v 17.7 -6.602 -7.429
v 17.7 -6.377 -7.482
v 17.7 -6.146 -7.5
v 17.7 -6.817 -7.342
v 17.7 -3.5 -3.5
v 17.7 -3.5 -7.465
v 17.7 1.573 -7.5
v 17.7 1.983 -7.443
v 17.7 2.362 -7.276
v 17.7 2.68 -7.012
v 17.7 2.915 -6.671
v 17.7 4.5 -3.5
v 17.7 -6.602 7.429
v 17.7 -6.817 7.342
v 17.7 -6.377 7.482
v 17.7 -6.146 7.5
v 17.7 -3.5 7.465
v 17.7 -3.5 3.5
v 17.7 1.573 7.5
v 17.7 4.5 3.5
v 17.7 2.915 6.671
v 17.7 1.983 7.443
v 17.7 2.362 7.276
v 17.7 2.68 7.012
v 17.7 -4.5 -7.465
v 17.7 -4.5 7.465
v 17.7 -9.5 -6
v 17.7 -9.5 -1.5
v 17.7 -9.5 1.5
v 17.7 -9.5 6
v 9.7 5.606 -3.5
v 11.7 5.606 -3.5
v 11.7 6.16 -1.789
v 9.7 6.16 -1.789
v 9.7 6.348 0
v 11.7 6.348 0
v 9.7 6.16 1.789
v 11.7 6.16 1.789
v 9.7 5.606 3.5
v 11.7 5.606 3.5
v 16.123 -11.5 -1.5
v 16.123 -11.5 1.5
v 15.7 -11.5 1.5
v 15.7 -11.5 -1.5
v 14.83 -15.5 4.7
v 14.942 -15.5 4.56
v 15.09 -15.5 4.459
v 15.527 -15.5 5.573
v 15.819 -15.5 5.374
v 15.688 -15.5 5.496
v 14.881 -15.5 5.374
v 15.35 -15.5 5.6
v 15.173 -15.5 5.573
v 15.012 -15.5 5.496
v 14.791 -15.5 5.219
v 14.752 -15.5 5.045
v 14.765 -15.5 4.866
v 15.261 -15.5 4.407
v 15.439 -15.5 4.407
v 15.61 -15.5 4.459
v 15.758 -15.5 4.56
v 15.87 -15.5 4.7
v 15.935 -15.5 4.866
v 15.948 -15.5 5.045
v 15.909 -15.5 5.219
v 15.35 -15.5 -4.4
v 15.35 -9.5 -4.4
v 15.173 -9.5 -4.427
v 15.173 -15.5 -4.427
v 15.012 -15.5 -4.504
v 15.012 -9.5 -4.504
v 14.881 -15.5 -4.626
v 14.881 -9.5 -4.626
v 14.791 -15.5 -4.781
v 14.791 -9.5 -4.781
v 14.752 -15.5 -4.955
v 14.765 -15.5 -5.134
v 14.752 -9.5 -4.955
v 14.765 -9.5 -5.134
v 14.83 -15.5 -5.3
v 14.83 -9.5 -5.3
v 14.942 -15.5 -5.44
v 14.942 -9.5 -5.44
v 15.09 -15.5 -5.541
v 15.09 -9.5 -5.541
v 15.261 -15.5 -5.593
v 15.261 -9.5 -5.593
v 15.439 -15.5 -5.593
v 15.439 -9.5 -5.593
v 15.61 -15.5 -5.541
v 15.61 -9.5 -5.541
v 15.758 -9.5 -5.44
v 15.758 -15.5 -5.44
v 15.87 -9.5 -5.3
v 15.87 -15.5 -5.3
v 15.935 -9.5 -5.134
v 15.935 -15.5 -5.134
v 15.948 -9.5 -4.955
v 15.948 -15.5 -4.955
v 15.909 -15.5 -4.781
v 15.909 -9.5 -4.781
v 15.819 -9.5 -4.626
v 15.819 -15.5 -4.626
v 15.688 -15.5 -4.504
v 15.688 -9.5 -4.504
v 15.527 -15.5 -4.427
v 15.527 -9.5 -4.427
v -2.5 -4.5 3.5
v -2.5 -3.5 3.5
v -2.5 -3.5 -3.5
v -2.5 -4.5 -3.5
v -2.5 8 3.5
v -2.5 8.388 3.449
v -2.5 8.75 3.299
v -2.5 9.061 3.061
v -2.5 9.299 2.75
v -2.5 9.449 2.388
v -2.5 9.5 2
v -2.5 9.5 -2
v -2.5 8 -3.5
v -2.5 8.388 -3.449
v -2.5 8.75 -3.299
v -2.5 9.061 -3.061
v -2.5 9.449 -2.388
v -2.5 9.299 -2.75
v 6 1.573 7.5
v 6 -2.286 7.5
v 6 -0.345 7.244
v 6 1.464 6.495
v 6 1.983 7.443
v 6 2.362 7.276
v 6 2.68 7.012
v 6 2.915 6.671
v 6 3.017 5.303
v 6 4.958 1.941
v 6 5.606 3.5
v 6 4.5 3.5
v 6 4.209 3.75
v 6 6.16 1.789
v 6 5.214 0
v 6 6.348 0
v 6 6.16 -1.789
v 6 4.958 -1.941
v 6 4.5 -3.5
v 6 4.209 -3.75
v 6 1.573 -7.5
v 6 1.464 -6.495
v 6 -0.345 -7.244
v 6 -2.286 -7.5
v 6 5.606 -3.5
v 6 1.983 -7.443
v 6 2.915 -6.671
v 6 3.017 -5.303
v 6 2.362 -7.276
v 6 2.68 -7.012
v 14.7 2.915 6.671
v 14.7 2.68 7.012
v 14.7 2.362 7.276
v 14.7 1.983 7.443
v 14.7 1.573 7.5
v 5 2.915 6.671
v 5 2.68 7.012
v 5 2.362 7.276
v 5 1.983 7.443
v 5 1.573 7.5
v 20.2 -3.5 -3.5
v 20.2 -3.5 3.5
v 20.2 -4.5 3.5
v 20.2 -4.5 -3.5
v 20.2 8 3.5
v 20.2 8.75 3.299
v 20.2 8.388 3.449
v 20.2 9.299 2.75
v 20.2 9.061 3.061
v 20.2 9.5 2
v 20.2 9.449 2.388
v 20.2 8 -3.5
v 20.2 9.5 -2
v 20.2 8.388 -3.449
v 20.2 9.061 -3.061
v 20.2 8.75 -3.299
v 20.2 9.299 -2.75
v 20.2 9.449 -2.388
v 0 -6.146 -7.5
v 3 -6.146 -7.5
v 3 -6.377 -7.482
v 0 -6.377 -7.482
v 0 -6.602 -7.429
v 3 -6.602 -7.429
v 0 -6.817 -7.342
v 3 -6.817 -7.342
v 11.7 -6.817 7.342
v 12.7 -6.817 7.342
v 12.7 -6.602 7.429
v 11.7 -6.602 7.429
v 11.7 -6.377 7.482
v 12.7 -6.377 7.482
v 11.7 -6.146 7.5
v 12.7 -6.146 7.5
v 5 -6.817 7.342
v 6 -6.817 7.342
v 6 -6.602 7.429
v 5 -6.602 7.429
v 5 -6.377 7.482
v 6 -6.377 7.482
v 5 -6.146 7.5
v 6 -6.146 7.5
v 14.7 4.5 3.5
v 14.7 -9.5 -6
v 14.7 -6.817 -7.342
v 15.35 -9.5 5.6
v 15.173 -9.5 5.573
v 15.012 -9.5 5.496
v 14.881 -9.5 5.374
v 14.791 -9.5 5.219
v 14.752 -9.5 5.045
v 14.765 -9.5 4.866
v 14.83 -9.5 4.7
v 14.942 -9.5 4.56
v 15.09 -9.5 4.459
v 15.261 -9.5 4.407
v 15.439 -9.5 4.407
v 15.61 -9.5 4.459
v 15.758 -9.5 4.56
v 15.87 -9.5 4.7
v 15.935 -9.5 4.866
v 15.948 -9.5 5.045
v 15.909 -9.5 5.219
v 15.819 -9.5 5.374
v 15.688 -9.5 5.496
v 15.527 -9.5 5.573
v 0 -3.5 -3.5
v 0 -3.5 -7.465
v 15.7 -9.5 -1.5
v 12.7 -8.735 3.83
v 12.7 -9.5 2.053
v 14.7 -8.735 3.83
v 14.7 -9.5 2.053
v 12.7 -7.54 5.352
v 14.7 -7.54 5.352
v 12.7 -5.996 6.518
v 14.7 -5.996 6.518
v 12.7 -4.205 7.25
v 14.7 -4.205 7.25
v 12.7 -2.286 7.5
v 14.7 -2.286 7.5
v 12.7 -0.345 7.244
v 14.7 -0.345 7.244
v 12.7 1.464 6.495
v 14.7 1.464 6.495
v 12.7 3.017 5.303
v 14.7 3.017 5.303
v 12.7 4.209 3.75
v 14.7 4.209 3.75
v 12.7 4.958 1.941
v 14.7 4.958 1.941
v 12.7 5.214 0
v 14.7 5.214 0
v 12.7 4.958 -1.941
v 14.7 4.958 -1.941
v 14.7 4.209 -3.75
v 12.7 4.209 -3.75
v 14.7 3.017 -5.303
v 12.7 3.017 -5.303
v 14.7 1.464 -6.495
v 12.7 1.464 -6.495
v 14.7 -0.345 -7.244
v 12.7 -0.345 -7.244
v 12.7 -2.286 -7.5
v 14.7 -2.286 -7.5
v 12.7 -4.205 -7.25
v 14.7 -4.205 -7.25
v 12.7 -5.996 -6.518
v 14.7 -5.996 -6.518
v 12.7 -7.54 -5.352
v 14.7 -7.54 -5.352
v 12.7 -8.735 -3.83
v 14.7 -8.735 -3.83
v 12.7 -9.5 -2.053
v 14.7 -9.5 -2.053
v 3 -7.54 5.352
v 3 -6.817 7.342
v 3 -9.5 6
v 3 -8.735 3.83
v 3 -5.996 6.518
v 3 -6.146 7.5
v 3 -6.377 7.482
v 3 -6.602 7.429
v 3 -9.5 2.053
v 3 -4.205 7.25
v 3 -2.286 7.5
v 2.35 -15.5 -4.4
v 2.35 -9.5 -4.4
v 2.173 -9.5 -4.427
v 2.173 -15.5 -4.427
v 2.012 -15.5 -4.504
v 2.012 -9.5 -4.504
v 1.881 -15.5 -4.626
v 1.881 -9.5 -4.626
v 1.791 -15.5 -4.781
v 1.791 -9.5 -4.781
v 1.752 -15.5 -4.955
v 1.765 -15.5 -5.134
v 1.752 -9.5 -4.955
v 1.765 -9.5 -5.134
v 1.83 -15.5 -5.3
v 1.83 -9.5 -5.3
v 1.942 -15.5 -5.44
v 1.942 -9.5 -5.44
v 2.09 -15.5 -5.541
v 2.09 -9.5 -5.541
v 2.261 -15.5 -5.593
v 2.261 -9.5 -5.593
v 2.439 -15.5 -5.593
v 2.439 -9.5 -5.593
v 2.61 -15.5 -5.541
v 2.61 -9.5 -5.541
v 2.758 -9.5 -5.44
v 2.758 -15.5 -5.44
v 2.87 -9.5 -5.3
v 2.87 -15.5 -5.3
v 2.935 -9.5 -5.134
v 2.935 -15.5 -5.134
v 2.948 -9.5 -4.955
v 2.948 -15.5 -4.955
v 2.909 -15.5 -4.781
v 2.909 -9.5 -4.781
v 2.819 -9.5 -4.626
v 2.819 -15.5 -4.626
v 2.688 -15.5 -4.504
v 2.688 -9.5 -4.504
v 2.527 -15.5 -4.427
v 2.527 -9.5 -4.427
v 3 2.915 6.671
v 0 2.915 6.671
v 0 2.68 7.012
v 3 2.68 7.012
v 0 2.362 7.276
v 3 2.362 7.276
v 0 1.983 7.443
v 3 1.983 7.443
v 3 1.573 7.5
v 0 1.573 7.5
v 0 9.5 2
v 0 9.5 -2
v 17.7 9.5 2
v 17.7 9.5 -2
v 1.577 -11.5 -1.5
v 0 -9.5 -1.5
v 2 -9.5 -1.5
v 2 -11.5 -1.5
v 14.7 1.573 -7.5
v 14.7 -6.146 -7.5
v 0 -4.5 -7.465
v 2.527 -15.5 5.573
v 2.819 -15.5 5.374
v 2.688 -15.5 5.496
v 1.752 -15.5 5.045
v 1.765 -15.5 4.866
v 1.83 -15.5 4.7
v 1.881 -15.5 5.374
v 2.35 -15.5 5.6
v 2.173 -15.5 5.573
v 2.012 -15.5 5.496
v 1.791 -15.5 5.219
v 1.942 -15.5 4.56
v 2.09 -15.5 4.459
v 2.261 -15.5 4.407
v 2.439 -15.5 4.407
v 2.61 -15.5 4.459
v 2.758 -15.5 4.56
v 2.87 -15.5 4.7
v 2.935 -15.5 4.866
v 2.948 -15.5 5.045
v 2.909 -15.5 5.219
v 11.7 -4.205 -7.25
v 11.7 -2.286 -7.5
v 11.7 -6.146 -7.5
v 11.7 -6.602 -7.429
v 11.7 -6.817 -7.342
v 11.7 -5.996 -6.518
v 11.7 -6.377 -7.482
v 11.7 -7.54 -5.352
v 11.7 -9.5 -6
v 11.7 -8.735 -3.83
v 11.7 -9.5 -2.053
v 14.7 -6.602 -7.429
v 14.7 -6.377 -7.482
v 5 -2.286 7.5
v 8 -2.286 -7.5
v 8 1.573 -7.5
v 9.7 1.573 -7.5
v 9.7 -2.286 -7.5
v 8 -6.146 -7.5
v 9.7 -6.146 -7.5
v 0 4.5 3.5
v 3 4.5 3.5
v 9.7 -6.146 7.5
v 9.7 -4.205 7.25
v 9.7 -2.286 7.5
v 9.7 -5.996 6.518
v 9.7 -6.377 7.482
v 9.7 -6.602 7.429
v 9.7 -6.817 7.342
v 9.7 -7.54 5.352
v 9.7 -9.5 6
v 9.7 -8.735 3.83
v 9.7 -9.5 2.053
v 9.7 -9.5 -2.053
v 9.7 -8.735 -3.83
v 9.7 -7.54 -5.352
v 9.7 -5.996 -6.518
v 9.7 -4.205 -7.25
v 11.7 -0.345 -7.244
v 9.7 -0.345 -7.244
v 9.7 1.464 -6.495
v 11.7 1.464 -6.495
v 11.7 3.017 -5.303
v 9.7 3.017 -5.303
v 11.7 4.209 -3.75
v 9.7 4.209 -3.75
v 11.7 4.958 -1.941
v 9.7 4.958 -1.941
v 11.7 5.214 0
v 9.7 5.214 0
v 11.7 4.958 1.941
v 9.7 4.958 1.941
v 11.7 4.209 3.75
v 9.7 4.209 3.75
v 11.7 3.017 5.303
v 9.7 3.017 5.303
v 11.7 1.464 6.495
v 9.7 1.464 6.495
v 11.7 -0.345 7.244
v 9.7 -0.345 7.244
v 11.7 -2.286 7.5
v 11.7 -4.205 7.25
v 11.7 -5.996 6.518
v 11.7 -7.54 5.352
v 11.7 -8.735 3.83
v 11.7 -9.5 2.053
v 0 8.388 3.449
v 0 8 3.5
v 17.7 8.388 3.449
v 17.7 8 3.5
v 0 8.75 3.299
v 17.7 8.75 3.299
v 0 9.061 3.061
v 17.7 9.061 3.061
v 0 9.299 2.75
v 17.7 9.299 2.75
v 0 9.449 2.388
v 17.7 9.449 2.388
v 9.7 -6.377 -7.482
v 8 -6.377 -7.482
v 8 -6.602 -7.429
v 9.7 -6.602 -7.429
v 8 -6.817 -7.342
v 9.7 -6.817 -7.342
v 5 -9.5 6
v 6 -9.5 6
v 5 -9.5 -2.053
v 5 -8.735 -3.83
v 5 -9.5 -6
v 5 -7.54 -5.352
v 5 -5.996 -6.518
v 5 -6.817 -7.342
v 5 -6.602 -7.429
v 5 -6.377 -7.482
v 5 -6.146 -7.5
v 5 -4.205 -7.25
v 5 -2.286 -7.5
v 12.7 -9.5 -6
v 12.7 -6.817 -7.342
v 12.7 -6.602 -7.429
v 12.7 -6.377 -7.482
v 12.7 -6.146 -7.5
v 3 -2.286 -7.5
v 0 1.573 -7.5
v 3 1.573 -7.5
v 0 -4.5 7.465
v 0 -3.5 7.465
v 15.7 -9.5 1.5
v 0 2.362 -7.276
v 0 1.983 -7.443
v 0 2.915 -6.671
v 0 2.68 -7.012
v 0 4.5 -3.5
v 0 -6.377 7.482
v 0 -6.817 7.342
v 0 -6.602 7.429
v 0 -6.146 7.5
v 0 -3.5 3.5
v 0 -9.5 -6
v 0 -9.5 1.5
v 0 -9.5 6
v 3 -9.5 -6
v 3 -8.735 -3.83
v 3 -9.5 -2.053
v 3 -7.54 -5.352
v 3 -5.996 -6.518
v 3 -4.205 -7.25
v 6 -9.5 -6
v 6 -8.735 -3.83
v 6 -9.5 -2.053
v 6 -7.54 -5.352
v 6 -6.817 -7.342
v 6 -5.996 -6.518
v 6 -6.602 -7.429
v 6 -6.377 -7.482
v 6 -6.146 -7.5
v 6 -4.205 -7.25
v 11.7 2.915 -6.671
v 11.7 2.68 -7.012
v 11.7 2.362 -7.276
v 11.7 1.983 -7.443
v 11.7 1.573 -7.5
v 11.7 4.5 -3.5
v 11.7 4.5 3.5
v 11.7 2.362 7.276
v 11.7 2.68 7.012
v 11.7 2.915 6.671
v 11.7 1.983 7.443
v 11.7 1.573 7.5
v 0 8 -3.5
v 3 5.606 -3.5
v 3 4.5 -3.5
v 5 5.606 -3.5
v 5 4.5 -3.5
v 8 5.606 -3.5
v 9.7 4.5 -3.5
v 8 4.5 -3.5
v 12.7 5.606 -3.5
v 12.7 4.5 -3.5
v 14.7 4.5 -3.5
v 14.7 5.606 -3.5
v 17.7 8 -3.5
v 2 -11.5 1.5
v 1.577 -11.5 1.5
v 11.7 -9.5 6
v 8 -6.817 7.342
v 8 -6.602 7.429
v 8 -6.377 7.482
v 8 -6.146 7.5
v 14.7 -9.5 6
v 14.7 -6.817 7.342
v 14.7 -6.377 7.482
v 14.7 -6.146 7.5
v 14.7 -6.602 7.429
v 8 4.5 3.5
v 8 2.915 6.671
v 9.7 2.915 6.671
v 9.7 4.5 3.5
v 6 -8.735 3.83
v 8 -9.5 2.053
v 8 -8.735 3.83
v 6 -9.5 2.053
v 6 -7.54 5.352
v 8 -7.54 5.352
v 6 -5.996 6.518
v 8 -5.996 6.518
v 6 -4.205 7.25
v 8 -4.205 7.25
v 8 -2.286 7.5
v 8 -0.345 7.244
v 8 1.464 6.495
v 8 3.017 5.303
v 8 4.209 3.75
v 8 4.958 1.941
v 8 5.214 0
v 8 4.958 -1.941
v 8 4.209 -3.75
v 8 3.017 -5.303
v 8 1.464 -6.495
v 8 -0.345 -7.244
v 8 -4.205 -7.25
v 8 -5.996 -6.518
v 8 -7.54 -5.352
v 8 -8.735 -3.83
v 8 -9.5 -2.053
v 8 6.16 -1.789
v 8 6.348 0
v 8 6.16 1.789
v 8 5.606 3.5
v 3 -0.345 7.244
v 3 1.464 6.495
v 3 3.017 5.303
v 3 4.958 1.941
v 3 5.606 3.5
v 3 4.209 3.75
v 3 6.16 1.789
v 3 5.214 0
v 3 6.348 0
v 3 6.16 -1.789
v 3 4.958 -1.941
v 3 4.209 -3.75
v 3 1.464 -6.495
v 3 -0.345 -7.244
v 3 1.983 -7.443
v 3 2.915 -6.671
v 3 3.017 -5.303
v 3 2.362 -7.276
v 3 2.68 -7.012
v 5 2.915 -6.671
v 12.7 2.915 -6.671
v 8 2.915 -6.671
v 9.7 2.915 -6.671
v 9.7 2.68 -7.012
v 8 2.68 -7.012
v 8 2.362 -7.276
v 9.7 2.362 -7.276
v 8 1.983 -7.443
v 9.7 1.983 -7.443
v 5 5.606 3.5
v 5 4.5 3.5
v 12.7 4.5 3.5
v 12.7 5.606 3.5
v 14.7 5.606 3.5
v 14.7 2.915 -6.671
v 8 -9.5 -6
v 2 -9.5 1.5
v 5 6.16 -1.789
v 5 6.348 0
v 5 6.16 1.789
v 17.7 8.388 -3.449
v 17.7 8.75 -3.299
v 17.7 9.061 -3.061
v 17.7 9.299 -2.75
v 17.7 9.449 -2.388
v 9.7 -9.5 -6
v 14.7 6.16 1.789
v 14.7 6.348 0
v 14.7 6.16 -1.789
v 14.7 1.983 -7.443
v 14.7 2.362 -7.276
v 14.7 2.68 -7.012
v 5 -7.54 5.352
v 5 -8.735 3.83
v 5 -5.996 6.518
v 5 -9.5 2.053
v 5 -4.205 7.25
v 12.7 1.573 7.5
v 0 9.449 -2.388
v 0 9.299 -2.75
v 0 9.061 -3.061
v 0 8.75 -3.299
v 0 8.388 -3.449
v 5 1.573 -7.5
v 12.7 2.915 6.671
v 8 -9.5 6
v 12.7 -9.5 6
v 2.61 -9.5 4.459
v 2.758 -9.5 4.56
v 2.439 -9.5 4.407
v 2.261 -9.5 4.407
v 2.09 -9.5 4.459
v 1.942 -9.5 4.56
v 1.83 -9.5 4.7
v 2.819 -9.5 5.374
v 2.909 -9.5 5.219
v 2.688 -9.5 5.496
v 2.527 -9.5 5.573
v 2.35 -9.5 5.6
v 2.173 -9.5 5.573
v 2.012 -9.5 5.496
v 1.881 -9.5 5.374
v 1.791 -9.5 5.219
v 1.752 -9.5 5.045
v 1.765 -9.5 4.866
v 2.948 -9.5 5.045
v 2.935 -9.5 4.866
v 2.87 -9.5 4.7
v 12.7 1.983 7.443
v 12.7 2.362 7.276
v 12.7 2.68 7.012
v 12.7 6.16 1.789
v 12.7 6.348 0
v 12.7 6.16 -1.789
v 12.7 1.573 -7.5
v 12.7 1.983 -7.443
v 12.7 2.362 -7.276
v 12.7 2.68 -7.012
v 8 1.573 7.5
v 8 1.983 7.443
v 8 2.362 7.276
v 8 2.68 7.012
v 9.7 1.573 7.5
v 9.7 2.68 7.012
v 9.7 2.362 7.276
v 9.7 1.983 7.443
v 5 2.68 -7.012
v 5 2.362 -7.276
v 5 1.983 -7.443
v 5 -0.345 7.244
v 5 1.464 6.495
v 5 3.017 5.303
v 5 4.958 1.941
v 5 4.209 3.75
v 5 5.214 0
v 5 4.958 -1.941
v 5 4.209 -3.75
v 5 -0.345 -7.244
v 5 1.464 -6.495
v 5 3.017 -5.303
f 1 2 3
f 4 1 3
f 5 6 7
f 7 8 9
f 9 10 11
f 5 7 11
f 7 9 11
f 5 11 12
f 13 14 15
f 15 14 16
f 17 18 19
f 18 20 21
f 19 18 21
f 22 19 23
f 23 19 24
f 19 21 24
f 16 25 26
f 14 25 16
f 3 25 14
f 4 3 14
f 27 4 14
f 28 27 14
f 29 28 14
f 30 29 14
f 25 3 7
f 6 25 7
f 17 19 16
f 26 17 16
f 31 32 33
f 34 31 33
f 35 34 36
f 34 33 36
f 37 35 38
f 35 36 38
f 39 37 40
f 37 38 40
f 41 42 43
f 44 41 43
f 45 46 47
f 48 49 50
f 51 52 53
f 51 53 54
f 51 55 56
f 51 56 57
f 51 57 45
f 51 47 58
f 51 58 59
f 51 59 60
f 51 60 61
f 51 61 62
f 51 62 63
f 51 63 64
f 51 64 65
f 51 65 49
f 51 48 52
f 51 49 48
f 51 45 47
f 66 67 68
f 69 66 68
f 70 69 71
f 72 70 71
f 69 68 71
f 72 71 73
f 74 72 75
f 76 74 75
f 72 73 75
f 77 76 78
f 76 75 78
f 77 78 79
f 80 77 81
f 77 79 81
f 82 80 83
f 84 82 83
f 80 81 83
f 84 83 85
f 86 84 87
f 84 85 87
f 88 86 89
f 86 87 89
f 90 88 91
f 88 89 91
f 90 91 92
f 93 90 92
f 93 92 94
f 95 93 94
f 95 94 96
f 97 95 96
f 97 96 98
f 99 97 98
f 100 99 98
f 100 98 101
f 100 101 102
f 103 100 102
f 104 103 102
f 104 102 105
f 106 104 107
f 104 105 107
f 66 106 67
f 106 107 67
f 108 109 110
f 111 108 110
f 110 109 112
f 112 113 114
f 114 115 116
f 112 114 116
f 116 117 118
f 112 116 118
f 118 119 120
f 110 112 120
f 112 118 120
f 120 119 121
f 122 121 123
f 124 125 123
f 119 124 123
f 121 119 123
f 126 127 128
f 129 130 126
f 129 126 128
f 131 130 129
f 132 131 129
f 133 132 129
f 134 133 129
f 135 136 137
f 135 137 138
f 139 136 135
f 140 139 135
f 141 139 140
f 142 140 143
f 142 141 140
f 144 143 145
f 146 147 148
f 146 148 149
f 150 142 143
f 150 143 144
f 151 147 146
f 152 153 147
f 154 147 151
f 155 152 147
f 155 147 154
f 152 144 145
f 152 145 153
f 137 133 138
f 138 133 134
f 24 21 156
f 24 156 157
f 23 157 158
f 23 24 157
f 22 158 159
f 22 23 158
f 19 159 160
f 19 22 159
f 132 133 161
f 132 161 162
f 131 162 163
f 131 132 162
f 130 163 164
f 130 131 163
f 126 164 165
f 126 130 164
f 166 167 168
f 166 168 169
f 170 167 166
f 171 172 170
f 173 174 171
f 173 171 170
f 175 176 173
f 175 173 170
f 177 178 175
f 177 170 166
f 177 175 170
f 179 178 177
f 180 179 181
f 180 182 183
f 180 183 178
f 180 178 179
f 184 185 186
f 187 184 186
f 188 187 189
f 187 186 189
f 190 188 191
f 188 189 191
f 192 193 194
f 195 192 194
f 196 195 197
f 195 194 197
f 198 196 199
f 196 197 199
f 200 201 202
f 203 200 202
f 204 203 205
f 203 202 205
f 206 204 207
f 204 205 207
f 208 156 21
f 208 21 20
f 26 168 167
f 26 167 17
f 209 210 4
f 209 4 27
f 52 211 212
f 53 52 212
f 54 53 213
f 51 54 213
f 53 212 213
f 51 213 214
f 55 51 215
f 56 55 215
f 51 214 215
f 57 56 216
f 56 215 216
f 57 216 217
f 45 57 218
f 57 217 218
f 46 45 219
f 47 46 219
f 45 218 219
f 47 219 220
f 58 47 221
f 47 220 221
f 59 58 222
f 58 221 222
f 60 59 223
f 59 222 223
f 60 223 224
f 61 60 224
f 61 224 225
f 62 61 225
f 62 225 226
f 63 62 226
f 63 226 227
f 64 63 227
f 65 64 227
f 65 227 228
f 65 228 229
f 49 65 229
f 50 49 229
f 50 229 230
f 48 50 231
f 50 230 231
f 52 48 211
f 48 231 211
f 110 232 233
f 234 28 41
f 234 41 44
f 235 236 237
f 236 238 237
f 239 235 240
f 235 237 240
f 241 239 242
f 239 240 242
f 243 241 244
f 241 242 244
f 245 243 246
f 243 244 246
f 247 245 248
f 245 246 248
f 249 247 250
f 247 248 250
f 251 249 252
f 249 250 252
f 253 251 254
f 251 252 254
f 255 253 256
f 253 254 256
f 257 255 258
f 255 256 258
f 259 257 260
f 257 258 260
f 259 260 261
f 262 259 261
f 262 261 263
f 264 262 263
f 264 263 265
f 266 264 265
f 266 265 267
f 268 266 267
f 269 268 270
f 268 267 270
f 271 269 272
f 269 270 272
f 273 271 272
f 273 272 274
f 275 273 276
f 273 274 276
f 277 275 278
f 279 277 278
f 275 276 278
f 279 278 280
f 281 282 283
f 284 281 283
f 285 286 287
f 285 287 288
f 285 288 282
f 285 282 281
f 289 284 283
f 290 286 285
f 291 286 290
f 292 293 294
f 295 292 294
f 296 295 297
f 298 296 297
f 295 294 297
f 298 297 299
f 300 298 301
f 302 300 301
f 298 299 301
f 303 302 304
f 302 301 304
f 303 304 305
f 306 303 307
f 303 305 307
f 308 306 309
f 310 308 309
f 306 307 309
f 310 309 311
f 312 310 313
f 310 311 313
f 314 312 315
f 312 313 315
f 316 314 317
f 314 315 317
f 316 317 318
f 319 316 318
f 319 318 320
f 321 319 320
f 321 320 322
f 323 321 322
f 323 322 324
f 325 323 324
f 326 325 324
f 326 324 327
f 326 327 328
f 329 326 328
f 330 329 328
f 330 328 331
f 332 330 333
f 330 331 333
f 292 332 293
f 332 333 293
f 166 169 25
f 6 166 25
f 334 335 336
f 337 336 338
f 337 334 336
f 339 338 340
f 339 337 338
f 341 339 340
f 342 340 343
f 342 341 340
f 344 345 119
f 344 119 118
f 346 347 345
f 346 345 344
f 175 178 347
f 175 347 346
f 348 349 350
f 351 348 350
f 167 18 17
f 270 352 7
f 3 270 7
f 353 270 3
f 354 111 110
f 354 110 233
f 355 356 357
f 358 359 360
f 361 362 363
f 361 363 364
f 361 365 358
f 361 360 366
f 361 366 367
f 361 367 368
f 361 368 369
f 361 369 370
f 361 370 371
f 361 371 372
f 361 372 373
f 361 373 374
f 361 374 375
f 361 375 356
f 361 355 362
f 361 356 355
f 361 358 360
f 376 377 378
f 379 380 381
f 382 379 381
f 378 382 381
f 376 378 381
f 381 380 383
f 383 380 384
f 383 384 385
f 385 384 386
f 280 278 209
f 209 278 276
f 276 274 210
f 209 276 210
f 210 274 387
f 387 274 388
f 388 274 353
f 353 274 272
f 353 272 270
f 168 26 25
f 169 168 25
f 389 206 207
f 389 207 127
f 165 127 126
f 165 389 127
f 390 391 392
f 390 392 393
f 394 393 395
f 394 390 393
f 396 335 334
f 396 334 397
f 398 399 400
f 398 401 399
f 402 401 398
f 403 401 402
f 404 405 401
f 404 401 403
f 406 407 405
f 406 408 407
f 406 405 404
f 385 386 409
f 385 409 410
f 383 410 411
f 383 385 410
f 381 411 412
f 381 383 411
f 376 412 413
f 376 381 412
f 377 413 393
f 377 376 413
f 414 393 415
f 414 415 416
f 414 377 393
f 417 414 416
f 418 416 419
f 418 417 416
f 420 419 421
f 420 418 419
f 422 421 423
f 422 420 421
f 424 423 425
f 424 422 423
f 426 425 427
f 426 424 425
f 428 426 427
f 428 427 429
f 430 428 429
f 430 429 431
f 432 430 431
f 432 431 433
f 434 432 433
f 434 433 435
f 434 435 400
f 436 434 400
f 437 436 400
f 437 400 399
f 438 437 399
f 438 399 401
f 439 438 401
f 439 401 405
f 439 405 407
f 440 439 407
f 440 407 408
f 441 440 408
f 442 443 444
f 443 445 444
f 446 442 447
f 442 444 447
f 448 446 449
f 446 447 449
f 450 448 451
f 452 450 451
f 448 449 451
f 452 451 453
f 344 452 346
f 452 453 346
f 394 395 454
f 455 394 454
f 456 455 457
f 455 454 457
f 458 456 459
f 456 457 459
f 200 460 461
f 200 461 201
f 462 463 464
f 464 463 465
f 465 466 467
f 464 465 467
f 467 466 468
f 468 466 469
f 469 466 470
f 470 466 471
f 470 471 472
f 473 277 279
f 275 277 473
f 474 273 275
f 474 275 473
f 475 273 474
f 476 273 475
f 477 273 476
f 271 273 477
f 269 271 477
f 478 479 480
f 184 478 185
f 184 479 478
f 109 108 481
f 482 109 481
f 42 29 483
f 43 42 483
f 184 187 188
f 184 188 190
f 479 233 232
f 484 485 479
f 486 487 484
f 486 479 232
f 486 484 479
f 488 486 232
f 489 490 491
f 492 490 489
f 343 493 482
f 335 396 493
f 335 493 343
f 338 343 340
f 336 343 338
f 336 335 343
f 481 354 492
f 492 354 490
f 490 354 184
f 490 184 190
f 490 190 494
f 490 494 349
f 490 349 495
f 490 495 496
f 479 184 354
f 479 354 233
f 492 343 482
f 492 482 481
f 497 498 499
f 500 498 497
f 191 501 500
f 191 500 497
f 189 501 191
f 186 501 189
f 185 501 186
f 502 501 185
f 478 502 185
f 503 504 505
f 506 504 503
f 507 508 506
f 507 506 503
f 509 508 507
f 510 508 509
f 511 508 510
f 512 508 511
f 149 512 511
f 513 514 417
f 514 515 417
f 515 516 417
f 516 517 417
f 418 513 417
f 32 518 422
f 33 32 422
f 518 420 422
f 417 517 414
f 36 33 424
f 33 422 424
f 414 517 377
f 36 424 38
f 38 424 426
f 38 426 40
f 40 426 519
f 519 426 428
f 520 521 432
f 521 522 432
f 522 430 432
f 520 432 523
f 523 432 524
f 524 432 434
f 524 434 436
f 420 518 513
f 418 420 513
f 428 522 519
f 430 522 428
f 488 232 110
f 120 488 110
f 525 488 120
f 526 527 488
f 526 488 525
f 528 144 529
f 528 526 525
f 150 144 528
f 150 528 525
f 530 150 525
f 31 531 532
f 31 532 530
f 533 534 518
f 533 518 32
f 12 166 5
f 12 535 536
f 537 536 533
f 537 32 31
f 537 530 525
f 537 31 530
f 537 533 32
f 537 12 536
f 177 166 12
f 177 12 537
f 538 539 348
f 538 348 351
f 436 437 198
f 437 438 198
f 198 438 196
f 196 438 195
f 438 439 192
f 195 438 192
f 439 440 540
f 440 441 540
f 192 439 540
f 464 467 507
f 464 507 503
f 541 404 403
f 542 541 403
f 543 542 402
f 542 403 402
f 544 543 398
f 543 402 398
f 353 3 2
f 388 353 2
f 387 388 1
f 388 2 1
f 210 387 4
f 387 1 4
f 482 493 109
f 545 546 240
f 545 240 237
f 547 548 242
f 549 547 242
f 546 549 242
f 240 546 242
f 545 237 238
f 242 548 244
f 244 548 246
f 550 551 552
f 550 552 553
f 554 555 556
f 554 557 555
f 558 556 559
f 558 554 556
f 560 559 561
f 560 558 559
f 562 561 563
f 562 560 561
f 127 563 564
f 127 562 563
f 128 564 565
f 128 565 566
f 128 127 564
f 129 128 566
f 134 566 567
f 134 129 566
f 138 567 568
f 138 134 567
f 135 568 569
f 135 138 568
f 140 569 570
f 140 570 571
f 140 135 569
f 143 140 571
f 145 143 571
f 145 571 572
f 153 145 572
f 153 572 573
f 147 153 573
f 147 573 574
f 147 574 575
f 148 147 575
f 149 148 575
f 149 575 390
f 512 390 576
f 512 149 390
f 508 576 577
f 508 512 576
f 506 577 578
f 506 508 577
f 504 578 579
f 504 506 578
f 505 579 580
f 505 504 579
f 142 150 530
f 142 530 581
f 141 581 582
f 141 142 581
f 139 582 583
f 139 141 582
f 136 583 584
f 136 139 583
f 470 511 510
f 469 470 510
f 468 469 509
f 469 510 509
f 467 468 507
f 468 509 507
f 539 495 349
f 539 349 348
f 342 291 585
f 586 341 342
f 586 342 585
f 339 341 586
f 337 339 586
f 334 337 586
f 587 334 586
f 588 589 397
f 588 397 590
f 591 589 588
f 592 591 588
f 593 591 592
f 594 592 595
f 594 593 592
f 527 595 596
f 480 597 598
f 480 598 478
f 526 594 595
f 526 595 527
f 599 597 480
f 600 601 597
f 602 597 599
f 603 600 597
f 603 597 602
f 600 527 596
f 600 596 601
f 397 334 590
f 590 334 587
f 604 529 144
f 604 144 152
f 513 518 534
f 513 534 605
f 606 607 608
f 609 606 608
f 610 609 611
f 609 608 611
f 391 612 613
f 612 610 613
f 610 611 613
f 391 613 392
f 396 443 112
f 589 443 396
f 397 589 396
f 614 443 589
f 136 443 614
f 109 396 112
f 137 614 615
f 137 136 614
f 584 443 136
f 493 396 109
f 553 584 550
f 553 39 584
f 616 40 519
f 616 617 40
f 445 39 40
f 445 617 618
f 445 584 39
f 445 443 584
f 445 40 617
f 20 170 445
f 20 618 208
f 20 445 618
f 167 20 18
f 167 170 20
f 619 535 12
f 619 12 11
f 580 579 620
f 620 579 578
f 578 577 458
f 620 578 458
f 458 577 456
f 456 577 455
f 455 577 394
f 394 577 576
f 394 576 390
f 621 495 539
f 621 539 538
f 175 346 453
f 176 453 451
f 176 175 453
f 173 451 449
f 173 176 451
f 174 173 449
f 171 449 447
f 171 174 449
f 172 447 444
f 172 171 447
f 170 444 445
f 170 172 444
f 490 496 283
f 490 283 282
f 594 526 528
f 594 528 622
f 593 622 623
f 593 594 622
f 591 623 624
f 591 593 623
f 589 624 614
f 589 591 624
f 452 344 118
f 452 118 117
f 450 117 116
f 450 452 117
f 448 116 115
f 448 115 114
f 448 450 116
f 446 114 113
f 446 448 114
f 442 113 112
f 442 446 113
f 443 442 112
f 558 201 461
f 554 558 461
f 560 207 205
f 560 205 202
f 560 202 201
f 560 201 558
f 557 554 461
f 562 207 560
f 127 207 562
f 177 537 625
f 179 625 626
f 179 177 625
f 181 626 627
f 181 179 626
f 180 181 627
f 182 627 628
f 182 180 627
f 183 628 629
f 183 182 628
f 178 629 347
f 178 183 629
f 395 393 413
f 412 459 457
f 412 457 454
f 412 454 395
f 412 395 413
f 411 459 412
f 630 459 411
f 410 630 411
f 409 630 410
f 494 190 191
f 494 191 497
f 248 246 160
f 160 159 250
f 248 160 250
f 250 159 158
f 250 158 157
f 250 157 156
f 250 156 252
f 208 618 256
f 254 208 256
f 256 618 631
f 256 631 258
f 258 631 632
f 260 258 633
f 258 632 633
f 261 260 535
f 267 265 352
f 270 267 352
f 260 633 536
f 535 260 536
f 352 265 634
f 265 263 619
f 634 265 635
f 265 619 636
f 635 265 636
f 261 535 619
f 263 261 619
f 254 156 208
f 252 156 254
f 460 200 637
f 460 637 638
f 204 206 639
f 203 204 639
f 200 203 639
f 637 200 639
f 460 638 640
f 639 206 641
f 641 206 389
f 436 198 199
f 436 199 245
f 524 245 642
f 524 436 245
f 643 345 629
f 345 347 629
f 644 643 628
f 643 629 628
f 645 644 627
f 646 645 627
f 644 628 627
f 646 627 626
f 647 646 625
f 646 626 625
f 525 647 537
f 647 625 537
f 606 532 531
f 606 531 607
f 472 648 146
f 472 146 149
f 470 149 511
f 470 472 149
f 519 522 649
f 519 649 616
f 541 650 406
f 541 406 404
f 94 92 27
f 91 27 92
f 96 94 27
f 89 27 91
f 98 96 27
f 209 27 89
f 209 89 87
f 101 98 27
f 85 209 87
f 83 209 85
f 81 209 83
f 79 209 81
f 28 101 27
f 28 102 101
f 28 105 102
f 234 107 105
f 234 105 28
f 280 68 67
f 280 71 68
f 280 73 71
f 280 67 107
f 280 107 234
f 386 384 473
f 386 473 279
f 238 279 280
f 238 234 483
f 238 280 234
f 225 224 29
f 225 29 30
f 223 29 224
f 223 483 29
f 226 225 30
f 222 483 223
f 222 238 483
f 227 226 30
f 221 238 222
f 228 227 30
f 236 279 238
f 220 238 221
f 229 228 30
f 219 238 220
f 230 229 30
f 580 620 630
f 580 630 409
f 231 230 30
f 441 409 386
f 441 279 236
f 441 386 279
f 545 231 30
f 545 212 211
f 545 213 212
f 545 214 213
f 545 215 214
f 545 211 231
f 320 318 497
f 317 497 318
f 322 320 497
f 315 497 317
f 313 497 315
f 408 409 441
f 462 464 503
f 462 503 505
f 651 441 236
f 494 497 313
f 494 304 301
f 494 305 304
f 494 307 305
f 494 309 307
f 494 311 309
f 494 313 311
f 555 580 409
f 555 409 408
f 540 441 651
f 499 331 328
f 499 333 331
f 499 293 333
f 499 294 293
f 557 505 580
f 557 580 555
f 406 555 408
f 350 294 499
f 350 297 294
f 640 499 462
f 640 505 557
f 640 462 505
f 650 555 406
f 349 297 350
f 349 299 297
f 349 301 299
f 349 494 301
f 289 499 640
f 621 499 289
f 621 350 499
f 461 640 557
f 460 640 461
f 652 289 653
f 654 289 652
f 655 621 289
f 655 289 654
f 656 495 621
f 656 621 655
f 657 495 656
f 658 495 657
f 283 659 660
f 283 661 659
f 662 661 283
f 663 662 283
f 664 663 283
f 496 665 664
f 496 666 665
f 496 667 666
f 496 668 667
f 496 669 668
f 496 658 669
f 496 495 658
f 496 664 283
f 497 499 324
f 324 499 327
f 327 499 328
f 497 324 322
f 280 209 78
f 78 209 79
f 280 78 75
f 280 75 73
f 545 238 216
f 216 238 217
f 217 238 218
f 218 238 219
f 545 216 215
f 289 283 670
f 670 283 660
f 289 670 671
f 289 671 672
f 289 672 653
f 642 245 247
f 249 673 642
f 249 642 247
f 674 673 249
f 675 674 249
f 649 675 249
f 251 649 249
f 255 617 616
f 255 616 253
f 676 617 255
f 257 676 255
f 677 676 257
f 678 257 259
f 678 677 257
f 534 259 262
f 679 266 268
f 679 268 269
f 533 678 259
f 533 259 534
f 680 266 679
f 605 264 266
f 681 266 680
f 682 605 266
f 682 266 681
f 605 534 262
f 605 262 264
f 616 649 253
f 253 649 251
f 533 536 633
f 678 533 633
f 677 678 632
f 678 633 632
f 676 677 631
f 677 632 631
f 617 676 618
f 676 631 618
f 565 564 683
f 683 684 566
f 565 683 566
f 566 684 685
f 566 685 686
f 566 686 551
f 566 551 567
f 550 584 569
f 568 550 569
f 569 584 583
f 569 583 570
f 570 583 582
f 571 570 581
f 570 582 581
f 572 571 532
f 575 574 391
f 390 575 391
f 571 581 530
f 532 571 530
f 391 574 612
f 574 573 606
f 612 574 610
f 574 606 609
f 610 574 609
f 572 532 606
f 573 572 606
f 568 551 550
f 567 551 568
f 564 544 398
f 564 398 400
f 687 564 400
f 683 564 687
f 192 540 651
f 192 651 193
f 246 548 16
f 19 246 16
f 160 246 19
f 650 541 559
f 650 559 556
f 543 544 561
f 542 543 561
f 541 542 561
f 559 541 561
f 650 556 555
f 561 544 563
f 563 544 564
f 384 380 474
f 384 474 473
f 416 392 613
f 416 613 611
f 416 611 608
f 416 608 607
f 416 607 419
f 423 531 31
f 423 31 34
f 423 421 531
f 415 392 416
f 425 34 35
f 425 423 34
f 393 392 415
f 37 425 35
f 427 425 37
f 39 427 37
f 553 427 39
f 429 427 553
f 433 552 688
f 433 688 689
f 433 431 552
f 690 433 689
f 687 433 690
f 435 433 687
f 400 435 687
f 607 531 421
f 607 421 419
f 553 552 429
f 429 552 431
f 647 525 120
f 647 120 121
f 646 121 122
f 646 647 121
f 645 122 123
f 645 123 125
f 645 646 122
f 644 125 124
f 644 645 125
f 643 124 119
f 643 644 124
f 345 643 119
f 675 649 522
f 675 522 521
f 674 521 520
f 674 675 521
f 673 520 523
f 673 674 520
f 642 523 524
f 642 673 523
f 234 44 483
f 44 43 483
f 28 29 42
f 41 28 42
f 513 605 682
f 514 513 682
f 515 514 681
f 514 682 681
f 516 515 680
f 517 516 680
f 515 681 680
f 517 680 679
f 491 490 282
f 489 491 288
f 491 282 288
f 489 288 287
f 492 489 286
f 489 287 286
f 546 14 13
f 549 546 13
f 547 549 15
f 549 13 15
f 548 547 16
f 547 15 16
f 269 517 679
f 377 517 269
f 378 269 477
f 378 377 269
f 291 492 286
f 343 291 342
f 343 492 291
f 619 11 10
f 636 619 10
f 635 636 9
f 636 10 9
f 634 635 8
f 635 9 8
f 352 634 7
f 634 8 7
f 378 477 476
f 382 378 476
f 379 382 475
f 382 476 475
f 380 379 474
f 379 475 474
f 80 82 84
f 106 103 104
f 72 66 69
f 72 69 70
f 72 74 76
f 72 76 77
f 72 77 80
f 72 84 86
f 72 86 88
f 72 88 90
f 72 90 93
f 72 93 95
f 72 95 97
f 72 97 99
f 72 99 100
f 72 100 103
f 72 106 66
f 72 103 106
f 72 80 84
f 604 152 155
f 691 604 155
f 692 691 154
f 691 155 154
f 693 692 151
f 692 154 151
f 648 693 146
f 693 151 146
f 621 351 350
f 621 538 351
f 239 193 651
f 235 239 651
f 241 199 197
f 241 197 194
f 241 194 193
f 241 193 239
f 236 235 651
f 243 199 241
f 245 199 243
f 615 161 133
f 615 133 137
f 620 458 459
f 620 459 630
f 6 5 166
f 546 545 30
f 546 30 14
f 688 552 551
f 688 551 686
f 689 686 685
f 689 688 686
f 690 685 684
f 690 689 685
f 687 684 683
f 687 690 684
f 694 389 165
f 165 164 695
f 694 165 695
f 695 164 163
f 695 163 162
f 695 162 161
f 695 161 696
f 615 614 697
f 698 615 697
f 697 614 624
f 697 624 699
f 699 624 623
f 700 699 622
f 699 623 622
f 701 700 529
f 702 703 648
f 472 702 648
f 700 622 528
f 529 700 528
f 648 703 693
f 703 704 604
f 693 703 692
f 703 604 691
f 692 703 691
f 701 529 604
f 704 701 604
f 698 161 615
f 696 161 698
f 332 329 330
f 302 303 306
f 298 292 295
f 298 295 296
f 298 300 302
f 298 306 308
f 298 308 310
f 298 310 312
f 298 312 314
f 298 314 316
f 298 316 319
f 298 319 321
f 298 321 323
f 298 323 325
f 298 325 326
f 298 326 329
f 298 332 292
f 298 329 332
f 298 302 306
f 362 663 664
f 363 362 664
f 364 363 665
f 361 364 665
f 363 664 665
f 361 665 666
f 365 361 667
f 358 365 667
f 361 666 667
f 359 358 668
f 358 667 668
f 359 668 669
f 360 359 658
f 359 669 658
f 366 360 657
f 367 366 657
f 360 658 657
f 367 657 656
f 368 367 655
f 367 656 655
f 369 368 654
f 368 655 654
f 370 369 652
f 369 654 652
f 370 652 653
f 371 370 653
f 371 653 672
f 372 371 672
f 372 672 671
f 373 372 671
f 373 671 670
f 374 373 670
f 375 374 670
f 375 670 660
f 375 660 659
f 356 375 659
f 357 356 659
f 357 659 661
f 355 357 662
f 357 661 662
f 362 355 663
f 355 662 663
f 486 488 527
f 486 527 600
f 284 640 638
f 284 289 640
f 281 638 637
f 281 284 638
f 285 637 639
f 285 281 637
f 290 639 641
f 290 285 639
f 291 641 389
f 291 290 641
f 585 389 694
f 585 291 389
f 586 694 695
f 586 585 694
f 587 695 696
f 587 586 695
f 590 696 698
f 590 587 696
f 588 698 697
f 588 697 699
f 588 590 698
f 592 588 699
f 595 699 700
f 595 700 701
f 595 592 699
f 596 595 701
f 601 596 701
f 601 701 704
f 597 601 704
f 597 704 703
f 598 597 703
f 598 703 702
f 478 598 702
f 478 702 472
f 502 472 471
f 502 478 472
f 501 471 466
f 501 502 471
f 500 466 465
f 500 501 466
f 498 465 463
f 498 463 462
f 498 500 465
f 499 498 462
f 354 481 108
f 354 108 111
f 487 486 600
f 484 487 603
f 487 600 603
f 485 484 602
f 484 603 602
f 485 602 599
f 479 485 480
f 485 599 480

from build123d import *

# Parameters (mm, degrees)
EXTRUDE_1_DEPTH          = 17.7
FILLET_1_R               = 1.5
EXTRUDE_2_DEPTH          = 2.5
EXTRUDE_2_DEPTH_BACK     = 20.2
EXTRUDE_3_DEPTH          = 1
MIRROR_6_COPY_1_DEPTH    = 1
SKETCH_5_R               = 0.6
EXTRUDE_4_DEPTH          = 6
EXTRUDE_6_DEPTH          = 1.5
SKETCH_9_R               = 7.5
CUT_EXTRUDE_1_DEPTH      = 2
PATTERN_LINEAR_1_COUNT   = 2
PATTERN_LINEAR_1_PITCH   = 3
MIRROR_8_COPY_1_SKETCH_R = 7.5
MIRROR_8_COPY_1_DEPTH    = 2


with BuildPart() as part:
    # Эскиз1 → Бобышка-Вытянуть1 (new body)
    with BuildSketch(Plane(origin=(0, 0, 0), x_dir=(0, 0, -1), z_dir=(1, 0, 0))):
        Polygon((-7.5, 2.5), (-3.5, 4.5), (-3.5, 9.5), (3.5, 9.5), (3.5, 4.5), (7.5, 2.5), (7.5, -6.5), (6, -9.5), (-6, -9.5), (-7.5, -6.5), align=None)
    extrude(amount=EXTRUDE_1_DEPTH)

    # Скругление1
    fillet_1_edges = [part.edges().sort_by_distance(p)[0] for p in [
        (8.85, 2.5, -7.5),
        (8.85, -6.5, -7.5),
        (8.85, -6.5, 7.5),
        (8.85, 2.5, 7.5),
        (8.85, 9.5, 3.5),
        (8.85, 9.5, -3.5),
    ]]
    fillet(fillet_1_edges, radius=FILLET_1_R)

    # Эскиз2 → Бобышка-Вытянуть2 (add, two sides: drawn at the far end of the back side and taken through both)
    with BuildSketch(Plane.ZY.offset(-EXTRUDE_2_DEPTH_BACK)):
        with BuildLine():
            Line((-2, 9.5), (2, 9.5))
            ThreePointArc((2, 9.5), (3.06066, 9.06066), (3.5, 8))
            Line((3.5, 8), (3.5, -4.5))
            Line((3.5, -4.5), (-3.5, -4.5))
            Line((-3.5, -4.5), (-3.5, 8))
            ThreePointArc((-3.5, 8), (-3.06066, 9.06066), (-2, 9.5))
        make_face()
    extrude(amount=EXTRUDE_2_DEPTH + EXTRUDE_2_DEPTH_BACK)

    # Эскиз4 → Бобышка-Вытянуть3 (add)
    with BuildSketch(Plane.XZ.offset(4.5)):
        Polygon((0, 3.5), (-2.5, 3.5), (0, 7.464813), align=None)
    extrude_3 = extrude(amount=-EXTRUDE_3_DEPTH)

    # Зеркальное отражение4: Бобышка-Вытянуть3 across plane
    add(extrude_3.mirror(Plane.XY))

    # Зеркальное отражение6: Бобышка-Вытянуть3 across plane
    add(extrude_3.mirror(Plane.ZY.offset(-8.85)))

    # Зеркальное отражение6 copy 1 sketch → Зеркальное отражение6 copy 1 (add)
    with BuildSketch(Plane(origin=(17.7, -4.5, 0), x_dir=(-1, 0, 0), z_dir=(0, -1, 0))):
        Polygon((0, 3.5), (-2.5, 3.5), (0, 7.464813), align=None)
    extrude(amount=-MIRROR_6_COPY_1_DEPTH)

    # Эскиз5 → Бобышка-Вытянуть4 (add)
    with BuildSketch(Plane.XZ.offset(9.5)):
        with Locations(Location((2.35, 5, 0), (0, 0, 90))):
            Circle(SKETCH_5_R)
        with Locations(Location((15.35, 5, 0), (0, 0, 90))):
            Circle(SKETCH_5_R)
        with Locations(Location((15.35, -5, 0), (0, 0, 90))):
            Circle(SKETCH_5_R)
        with Locations(Location((2.35, -5, 0), (0, 0, 90))):
            Circle(SKETCH_5_R)
    extrude(amount=EXTRUDE_4_DEPTH)

    # Эскиз8 → Бобышка-Вытянуть6 (add, symmetric)
    with BuildSketch(Plane.XY):
        Polygon((2, -9.5), (0, -9.5), (1.577317, -11.5), (2, -11.5), align=None)
    extrude_6 = extrude(amount=EXTRUDE_6_DEPTH, both=True)

    # Зеркальное отражение7: Бобышка-Вытянуть6 across plane
    add(extrude_6.mirror(Plane.ZY.offset(-8.85)))

    # Эскиз9 → Вырез-Вытянуть1 (cut)
    with BuildSketch(Plane.ZY.offset(-3)):
        with BuildLine():
            Line((-4.744729, -9.5), (-6, -9.5))
            Line((-6, -9.5), (-7.307128, -6.885745))
            ThreePointArc((-7.307128, -6.885745), (0, 6.347609), (7.307128, -6.885745))
            Line((7.307128, -6.885745), (6, -9.5))
            Line((6, -9.5), (4.744729, -9.5))
            ThreePointArc((4.744729, -9.5), (0, -10.920558), (-4.744729, -9.5))
        make_face()
        with Locations((0, -2.286475)):
            Circle(SKETCH_9_R, mode=Mode.SUBTRACT)
    cut_extrude_1 = extrude(amount=-CUT_EXTRUDE_1_DEPTH, mode=Mode.SUBTRACT)

    # Линейный массив1: Вырез-Вытянуть1 ×2
    with Locations(*[(i * PATTERN_LINEAR_1_PITCH, 0, 0) for i in range(1, PATTERN_LINEAR_1_COUNT)]):
        add(cut_extrude_1, mode=Mode.SUBTRACT)

    # Зеркальное отражение8: Вырез-Вытянуть1 across plane
    add(cut_extrude_1.mirror(Plane.ZY.offset(-8.85)), mode=Mode.SUBTRACT)

    # Зеркальное отражение8 copy 1 sketch → Зеркальное отражение8 copy 1 (cut)
    with BuildSketch(Plane(origin=(11.7, 0, 0), x_dir=(0, 0, 1), z_dir=(1, 0, 0))):
        with BuildLine():
            Line((-4.744729, 9.5), (-6, 9.5))
            Line((-6, 9.5), (-7.307128, 6.885745))
            ThreePointArc((-7.307128, 6.885745), (0, -6.347609), (7.307128, 6.885745))
            Line((7.307128, 6.885745), (6, 9.5))
            Line((6, 9.5), (4.744729, 9.5))
            ThreePointArc((4.744729, 9.5), (0, 10.920558), (-4.744729, 9.5))
        make_face()
        with Locations((0, 2.286475)):
            Circle(MIRROR_8_COPY_1_SKETCH_R, mode=Mode.SUBTRACT)
    extrude(amount=-MIRROR_8_COPY_1_DEPTH, mode=Mode.SUBTRACT)


solid = part.part
